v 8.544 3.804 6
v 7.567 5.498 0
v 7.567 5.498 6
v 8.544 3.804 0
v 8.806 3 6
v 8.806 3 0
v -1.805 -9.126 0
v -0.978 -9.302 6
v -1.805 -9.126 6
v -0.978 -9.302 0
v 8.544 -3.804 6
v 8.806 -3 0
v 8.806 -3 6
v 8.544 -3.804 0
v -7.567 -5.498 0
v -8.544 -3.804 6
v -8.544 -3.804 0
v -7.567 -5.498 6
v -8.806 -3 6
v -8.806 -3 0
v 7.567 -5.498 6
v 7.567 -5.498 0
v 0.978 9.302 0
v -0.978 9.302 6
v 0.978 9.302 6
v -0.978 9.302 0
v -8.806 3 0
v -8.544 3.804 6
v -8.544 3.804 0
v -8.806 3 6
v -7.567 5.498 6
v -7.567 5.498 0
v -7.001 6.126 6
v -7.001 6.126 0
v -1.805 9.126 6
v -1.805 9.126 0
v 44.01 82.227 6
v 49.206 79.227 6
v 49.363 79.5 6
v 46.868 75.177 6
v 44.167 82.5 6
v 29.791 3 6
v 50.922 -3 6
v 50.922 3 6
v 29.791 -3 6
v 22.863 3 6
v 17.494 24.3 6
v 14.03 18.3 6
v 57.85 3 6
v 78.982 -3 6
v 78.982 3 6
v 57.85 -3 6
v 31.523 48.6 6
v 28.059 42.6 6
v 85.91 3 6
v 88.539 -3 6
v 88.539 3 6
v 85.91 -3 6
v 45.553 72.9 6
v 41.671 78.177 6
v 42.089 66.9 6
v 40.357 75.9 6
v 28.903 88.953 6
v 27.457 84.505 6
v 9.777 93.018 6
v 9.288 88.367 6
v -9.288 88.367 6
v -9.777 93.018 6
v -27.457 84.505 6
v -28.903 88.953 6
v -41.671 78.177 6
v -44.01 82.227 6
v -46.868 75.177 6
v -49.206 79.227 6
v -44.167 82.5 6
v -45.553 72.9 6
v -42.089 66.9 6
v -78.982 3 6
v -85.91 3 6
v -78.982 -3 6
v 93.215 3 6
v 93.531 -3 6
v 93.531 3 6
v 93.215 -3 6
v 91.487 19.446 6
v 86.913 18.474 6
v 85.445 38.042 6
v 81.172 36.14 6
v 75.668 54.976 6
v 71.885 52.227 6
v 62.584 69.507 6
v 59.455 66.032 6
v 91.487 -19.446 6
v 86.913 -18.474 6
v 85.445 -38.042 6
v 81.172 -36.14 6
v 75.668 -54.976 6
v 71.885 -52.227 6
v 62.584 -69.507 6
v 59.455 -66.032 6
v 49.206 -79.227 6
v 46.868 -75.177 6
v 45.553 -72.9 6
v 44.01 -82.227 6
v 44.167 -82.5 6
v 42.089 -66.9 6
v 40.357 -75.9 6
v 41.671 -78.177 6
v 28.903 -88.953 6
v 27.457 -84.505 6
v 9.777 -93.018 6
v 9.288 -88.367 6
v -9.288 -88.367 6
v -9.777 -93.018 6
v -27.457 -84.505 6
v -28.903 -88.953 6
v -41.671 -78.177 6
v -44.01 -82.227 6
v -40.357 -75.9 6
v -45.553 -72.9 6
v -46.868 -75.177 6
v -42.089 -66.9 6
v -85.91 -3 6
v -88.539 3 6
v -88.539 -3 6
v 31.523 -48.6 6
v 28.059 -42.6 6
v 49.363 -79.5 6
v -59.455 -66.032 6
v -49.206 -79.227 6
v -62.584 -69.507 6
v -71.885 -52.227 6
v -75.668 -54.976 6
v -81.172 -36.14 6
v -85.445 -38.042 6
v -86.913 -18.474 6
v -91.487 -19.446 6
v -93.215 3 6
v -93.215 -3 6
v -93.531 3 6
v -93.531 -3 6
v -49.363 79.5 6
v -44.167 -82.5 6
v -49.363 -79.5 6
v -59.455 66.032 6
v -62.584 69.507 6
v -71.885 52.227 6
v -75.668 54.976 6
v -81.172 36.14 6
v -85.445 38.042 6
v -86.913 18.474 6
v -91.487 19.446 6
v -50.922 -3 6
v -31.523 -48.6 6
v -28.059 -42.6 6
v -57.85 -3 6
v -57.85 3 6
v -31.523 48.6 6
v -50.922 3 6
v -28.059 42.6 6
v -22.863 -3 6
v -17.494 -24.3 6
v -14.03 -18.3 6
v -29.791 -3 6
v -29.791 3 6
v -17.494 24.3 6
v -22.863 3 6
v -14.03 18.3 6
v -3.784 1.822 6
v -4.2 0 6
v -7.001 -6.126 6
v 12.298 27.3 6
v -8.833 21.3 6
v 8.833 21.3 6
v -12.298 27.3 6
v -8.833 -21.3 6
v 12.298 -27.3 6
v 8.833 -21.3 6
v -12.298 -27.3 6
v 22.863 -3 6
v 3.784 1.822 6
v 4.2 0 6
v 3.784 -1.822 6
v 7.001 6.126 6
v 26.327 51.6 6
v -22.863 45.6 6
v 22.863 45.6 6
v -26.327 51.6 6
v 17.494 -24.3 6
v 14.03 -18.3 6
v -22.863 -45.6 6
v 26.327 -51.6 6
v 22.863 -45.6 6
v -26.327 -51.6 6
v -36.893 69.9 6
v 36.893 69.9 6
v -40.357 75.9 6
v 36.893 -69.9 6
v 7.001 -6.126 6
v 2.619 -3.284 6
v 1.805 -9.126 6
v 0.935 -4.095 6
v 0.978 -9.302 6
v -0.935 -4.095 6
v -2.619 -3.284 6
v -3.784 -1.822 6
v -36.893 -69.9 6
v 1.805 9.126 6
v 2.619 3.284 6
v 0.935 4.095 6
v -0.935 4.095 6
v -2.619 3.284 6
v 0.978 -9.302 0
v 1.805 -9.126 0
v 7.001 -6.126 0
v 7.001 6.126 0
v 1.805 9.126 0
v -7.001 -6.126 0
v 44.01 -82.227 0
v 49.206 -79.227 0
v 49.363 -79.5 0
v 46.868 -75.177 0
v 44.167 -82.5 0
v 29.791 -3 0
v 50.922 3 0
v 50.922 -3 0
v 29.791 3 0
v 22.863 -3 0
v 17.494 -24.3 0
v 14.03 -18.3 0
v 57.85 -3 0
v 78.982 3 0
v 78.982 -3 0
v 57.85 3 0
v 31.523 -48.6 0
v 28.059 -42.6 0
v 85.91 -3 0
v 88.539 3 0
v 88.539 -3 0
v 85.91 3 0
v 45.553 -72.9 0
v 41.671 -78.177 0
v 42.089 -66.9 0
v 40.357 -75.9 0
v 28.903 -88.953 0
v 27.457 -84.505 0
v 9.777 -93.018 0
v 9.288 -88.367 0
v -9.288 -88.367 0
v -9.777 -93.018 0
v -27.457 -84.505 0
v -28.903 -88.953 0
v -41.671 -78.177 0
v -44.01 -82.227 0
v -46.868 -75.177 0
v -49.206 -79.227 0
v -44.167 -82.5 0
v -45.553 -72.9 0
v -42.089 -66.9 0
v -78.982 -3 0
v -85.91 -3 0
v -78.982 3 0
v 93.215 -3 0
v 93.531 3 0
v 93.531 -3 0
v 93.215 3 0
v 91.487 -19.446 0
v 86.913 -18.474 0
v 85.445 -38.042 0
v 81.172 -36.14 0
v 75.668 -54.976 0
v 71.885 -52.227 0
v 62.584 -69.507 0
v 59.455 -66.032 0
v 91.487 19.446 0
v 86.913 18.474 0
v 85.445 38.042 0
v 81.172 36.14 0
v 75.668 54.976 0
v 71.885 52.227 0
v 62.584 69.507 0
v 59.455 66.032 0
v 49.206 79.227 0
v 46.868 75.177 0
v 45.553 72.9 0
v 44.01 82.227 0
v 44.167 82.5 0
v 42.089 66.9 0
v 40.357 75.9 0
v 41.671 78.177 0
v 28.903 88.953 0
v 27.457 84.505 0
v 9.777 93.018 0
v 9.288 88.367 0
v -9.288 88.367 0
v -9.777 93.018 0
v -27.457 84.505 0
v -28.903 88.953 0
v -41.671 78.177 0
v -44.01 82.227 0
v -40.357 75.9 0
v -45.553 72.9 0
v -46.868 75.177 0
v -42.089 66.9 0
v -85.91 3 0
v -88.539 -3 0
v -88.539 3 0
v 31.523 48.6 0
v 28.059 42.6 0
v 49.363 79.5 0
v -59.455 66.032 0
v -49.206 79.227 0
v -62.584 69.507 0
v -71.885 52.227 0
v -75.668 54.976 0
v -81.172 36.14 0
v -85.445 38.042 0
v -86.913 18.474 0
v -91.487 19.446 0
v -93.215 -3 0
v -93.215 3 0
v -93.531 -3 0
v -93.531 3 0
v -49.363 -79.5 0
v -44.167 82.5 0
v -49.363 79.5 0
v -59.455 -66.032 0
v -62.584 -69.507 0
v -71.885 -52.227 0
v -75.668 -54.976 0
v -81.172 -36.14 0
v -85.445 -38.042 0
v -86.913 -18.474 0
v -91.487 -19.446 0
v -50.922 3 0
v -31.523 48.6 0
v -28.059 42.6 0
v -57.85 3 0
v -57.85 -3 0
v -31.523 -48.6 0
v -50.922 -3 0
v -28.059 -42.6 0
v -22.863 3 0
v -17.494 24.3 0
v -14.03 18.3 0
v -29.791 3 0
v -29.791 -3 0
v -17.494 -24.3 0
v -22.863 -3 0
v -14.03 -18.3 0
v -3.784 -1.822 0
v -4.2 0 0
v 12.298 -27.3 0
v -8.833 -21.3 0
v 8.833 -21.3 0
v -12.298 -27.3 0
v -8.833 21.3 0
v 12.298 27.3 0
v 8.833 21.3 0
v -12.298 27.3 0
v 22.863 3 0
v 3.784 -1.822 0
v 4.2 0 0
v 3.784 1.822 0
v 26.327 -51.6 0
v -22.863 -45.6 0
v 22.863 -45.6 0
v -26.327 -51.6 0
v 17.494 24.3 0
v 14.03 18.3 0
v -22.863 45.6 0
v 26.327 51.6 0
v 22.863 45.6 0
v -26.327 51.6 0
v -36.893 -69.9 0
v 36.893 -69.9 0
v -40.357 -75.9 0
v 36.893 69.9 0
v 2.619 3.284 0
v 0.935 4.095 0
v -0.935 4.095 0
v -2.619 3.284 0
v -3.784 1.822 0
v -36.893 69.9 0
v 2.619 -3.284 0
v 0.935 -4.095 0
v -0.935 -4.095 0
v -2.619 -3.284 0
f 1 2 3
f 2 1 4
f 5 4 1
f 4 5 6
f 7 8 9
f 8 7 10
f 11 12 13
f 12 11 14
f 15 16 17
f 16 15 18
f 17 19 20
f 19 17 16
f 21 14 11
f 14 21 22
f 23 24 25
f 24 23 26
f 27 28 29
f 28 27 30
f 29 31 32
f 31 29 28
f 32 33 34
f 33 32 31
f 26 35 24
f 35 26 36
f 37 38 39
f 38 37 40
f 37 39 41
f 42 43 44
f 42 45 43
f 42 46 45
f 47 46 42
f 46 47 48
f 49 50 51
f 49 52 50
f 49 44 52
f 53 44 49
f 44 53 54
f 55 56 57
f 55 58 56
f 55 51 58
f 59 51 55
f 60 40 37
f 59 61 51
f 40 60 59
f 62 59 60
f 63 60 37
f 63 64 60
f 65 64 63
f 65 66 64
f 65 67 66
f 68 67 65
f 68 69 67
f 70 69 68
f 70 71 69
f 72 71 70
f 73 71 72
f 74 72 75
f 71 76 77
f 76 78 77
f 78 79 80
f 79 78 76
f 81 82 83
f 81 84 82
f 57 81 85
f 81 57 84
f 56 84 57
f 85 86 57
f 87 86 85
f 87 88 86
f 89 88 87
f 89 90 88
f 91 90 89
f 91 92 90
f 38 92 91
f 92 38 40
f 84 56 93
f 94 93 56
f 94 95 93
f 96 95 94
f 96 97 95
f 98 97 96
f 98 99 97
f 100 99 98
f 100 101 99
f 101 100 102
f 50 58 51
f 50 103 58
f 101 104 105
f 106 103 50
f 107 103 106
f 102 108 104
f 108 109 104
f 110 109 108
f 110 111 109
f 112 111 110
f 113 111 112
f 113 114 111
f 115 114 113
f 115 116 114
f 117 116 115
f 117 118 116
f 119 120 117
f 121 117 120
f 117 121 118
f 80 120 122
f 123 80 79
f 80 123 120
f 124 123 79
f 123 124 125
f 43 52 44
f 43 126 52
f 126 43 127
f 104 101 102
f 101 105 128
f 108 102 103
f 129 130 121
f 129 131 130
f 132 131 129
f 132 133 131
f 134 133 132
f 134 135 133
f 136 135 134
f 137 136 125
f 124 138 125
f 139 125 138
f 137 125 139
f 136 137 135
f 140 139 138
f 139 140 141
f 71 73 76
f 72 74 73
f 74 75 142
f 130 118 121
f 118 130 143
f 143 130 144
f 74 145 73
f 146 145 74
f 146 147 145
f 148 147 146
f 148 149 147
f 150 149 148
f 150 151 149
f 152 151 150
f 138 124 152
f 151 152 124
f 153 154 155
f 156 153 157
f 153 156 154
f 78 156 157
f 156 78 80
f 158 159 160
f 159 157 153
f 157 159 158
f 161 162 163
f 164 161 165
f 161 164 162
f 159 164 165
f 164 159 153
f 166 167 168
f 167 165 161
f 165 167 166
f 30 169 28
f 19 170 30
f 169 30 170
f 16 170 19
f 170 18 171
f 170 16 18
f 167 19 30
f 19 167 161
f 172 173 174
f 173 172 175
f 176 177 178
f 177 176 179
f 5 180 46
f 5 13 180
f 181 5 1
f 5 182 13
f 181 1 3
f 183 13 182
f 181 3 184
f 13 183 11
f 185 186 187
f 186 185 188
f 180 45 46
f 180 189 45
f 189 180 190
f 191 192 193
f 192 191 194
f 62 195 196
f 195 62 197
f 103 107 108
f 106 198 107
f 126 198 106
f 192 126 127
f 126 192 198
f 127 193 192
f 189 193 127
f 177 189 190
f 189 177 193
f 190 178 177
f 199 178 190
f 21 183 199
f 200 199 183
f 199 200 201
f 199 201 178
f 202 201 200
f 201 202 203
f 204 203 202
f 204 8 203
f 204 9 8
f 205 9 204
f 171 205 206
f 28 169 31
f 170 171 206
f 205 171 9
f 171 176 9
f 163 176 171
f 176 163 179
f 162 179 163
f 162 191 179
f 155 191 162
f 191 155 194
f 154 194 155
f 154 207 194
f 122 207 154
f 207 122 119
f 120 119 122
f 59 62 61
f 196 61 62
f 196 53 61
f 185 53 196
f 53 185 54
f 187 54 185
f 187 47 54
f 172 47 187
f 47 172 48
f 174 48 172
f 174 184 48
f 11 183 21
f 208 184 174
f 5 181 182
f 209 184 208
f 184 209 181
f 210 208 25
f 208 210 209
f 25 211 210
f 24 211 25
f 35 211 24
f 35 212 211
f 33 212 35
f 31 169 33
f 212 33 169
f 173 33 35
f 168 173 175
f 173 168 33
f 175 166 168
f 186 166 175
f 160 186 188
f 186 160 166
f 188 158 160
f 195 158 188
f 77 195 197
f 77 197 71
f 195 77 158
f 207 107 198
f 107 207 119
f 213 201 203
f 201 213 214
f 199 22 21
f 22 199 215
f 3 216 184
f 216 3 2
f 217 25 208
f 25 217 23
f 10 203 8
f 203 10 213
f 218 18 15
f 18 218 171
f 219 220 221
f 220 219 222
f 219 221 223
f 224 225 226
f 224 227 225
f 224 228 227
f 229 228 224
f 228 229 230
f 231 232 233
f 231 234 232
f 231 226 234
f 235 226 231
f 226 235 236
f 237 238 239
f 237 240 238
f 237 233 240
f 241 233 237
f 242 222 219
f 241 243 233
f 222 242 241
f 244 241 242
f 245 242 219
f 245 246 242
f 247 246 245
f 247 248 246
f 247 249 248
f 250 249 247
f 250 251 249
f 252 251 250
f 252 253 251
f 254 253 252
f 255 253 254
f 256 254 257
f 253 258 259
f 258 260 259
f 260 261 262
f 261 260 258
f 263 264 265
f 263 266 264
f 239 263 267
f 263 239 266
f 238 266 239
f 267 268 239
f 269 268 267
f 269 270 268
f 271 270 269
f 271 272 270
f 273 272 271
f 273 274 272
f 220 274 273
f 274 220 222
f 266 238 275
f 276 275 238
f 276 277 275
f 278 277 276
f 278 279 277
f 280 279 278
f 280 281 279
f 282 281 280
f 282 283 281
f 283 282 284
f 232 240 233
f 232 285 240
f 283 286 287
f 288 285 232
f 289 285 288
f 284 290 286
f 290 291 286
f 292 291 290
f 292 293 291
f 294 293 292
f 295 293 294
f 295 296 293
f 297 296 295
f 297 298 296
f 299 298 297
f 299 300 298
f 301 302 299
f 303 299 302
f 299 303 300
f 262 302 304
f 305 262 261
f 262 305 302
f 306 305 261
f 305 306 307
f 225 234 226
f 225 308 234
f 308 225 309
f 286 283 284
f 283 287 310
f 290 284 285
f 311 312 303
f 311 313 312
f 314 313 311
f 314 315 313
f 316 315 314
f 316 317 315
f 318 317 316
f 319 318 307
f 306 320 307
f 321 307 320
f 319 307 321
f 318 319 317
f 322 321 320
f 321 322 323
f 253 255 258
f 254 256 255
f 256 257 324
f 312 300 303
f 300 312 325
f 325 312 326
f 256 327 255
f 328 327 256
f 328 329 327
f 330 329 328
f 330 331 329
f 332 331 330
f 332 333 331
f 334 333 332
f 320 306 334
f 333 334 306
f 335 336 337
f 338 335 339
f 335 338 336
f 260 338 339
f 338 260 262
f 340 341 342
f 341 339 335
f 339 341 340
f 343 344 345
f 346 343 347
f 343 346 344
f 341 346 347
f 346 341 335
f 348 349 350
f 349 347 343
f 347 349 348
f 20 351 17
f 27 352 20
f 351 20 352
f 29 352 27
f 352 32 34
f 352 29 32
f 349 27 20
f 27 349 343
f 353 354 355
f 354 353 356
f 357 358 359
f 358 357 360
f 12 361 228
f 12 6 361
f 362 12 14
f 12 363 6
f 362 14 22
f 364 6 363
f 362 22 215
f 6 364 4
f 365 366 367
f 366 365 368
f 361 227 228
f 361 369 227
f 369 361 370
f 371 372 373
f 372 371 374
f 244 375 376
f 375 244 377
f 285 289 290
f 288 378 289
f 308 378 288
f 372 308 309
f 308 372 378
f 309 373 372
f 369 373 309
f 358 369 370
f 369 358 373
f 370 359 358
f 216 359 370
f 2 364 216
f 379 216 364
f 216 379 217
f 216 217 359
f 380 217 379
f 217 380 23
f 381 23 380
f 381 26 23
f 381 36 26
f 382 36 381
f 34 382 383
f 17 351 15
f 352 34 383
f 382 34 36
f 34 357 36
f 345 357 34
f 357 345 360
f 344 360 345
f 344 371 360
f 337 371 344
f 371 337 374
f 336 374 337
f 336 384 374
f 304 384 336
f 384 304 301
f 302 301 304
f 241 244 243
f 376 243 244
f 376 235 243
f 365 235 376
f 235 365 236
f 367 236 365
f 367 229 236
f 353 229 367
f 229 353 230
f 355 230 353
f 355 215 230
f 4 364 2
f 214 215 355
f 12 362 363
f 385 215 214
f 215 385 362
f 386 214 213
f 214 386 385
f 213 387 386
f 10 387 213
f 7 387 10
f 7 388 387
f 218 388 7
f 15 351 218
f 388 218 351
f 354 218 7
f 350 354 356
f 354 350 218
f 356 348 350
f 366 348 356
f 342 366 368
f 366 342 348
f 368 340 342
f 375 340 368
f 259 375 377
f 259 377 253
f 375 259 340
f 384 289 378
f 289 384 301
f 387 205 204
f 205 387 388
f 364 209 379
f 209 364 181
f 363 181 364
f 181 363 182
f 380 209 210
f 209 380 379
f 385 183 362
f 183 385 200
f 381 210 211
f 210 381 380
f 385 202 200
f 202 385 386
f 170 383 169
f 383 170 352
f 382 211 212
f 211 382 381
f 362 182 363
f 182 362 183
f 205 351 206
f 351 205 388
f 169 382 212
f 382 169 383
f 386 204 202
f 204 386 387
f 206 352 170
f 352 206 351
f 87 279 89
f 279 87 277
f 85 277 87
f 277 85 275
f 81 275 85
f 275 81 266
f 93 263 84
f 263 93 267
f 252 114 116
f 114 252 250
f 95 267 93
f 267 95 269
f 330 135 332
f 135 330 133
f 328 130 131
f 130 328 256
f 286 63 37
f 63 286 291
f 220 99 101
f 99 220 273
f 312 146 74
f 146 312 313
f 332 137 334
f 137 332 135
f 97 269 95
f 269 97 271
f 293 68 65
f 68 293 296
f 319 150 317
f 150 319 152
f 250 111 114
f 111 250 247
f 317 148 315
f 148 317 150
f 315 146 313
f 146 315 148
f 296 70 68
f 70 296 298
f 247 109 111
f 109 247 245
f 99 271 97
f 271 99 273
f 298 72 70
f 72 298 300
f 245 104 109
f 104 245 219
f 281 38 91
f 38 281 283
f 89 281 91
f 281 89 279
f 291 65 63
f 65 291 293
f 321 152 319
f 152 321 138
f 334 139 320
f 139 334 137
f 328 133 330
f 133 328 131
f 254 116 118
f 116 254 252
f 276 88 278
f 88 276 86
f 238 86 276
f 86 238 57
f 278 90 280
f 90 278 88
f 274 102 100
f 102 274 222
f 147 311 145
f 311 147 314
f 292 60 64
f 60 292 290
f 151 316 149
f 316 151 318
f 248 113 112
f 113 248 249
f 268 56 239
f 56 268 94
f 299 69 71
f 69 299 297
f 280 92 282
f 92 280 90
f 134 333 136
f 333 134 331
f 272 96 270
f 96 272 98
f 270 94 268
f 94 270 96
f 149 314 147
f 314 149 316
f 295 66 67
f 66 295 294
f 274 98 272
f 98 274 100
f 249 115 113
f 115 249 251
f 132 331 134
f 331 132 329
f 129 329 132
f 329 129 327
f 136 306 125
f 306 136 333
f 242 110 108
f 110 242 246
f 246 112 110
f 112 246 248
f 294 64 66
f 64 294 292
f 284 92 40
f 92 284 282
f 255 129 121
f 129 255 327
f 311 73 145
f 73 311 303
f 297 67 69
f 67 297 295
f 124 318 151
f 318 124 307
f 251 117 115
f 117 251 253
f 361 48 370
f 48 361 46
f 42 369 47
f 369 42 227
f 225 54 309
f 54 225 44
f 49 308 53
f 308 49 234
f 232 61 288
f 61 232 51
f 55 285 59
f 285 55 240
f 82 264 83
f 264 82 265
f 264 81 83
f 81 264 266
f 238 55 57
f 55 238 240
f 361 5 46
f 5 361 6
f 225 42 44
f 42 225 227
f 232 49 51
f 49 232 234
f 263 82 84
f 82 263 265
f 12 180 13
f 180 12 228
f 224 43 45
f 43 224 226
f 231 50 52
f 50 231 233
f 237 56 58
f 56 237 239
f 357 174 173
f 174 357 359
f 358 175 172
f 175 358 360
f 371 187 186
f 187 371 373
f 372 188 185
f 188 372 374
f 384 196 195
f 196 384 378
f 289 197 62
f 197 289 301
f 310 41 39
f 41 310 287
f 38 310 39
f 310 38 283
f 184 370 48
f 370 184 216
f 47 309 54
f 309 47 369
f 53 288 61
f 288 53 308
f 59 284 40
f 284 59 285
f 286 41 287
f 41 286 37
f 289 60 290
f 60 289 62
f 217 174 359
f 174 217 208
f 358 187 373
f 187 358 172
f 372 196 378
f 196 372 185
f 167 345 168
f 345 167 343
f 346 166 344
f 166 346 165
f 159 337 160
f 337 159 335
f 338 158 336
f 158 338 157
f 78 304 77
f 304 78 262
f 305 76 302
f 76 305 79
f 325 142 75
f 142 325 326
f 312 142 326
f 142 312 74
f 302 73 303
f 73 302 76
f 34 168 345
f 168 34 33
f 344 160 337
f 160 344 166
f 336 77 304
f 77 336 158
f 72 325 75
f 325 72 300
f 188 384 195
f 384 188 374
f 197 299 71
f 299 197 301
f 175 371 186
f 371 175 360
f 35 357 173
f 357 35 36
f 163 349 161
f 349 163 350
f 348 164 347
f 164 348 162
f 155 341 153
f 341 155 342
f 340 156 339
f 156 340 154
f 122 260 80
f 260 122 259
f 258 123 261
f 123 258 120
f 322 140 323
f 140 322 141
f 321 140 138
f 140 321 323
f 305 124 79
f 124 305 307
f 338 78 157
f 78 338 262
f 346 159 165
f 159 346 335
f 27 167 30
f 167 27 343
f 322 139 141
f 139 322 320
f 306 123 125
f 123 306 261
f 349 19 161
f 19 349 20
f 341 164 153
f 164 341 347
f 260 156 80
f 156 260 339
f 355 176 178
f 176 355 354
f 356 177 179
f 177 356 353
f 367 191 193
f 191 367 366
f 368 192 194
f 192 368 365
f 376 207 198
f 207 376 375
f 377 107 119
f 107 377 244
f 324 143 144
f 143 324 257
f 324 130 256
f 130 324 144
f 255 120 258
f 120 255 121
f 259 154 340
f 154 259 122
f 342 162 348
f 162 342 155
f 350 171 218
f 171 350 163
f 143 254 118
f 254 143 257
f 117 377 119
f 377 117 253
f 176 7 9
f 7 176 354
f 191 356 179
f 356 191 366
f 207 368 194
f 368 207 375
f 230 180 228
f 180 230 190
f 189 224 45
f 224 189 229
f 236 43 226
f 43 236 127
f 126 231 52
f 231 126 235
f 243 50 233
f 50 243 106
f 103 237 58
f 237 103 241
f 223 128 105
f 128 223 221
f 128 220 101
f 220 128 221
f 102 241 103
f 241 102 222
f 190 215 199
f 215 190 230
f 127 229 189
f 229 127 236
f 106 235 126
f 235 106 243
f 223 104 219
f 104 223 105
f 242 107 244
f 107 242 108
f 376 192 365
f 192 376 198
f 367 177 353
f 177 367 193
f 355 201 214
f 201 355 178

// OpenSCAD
// file: commons.scad
module rect_prism(width, height, p0, p1) {
    dir = p1 - p0;
    h = norm(dir);
    if (dir[0] == 0 && dir[1] == 0) {
        // no transformation necessary
        translate(p0)
        translate([0, 0, h/2])
        cube([size, size, h], center = true);
    }
    else {
        w  = dir / h;
        u0 = cross(w, [0,0,1]);
        u  = u0 / norm(u0);
        v0 = cross(w, u);
        v  = v0 / norm(v0);
        multmatrix(m=[[u[0], v[0], w[0], p0.x],
                      [u[1], v[1], w[1], p0.y],
                      [u[2], v[2], w[2], p0.z],
                      [0,    0,    0,    1]])
        translate([0, 0, h/2])
        cube([width, height, h], center = true);
    }
}

module square_prism(size, p0, p1) {
    rect_prism(size, size, p0, p1);
}

module point_plate(thickness, point_array, indices, fn = 8) {
    hull() {
        for (i = indices) {
            translate(point_array[i])
            sphere(d = thickness, $fn = fn);
        }
    }
}
// file: carousel-config.scad
// ----------------------------------------------------------------------------
// Configuration of the carousel and its components.
//
// All the values beyod "---- derived" string in each of the sections should
// not be modified manually, as they are derived from the previously defined
// parameters in some way...
// ----------------------------------------------------------------------------

// Generic parameters to address consistency & interconnections of parts.
CYL_FN = 32; // BEWARE!!! set to +- 256 for STL export!
BLEED = 0.5; // overlap for union & difference operations
EASE = 0.2; // socket/pin ease for interconnecting of parts & holes

// Core defining shape of our carousel is N-faced cylinder.
// This affects most of the subsequent parameter definitions & usage.
CAROUSEL_FACE_COUNT = 6;
CAROUSEL_ESCRIBED_RADIUS = 120;
// ---- derived
CAROUSEL_INSCRIBED_RADIUS = CAROUSEL_ESCRIBED_RADIUS * cos(180/CAROUSEL_FACE_COUNT);

// Base of the carousel -> stand that holds the axle, walls, etc.
BASE_TOTAL_HEIGHT = 24;
BASE_FLOOR_THICKNESS = 4;
BASE_WALL_THICKNESS = 4;

// Face, or, a wall of the carousel "shell".
FACE_HEIGHT = 150;
FACE_THICKNESS = 5;
// ---- derived
FACE_WIDTH = CAROUSEL_ESCRIBED_RADIUS * 2 * sin(180/CAROUSEL_FACE_COUNT);
FACE_ANGLE = (1 - 2/CAROUSEL_FACE_COUNT)*180;
FACE_APOTHEM_LEN = FACE_WIDTH / (2 * tan(180/CAROUSEL_FACE_COUNT));
FACE_DOOR_HEIGHT = 0.66 * FACE_HEIGHT;
FACE_DOOR_WIDTH = 0.75 * FACE_WIDTH;

// Roof of the carousel.
ROOF_THICKNESS = 1;
ROOF_HEIGHT = 0.3 * FACE_HEIGHT;

// Ball bearing - real-life dimensions of ball bearing used to "power" the axle.
BEARING_OUTER_D = 22;
BEARING_INNER_D = 8;
BEARING_HEIGHT = 7;
BEARING_SHELL_THICKNESS = 2;

// Axle rotating inside carousel.
AXLE_RADIUS = 4;

// Rotating rig carrying the seats.
RIG_HEIGHT = 6;
RIG_STR = 6;

// Abstract "rings" carrying seats, and their distance off the carousel center
// as a fraction of radius.
RIG_RING_POSITIONS = [0.3, 0.6, 0.9];
RIG_MAX_R = 0.90 * CAROUSEL_INSCRIBED_RADIUS;
// main file
include <carousel-config.scad>;
use <commons.scad>;

// Top rotating part used to attach the carousel seats.
module carousel_rig() {
    inner_sin = sin(360/CAROUSEL_FACE_COUNT/2);

    color("SaddleBrown") {
        // core ring
        difference() {
            cylinder(h = RIG_HEIGHT, r = 0.1 * RIG_MAX_R);
            translate([0, 0, -0.5 * BLEED])
            cylinder(h = RIG_HEIGHT + BLEED, r = AXLE_RADIUS + EASE);
        }
        // outer ring
        difference() {
            cylinder(h = RIG_HEIGHT, r = RIG_MAX_R);
            translate([0, 0, -0.5 * BLEED])
            cylinder(h = RIG_HEIGHT + BLEED, r = 0.95 * RIG_MAX_R);
        }
        // iterate each face/wall spot
        dz = 0.5 * RIG_STR;
        for (i = [0 : CAROUSEL_FACE_COUNT]){
            rotate(i * 360/CAROUSEL_FACE_COUNT, [0, 0, 1]) {
                // star-beam
                square_prism(RIG_STR, [0.05 * RIG_MAX_R, 0, dz], [RIG_MAX_R, 0, dz]);
                // cross-beams
                for (frac = RIG_RING_POSITIONS) {
                    ring_r = frac * RIG_MAX_R;
                    translate([ring_r, 0, 0])
                    rotate([0, 0, 180 - FACE_ANGLE/2])
                    square_prism(RIG_STR, [0, 0, dz], [2 * ring_r * inner_sin, 0, dz]);
                }
            }
        }
    }
}

carousel_rig();
